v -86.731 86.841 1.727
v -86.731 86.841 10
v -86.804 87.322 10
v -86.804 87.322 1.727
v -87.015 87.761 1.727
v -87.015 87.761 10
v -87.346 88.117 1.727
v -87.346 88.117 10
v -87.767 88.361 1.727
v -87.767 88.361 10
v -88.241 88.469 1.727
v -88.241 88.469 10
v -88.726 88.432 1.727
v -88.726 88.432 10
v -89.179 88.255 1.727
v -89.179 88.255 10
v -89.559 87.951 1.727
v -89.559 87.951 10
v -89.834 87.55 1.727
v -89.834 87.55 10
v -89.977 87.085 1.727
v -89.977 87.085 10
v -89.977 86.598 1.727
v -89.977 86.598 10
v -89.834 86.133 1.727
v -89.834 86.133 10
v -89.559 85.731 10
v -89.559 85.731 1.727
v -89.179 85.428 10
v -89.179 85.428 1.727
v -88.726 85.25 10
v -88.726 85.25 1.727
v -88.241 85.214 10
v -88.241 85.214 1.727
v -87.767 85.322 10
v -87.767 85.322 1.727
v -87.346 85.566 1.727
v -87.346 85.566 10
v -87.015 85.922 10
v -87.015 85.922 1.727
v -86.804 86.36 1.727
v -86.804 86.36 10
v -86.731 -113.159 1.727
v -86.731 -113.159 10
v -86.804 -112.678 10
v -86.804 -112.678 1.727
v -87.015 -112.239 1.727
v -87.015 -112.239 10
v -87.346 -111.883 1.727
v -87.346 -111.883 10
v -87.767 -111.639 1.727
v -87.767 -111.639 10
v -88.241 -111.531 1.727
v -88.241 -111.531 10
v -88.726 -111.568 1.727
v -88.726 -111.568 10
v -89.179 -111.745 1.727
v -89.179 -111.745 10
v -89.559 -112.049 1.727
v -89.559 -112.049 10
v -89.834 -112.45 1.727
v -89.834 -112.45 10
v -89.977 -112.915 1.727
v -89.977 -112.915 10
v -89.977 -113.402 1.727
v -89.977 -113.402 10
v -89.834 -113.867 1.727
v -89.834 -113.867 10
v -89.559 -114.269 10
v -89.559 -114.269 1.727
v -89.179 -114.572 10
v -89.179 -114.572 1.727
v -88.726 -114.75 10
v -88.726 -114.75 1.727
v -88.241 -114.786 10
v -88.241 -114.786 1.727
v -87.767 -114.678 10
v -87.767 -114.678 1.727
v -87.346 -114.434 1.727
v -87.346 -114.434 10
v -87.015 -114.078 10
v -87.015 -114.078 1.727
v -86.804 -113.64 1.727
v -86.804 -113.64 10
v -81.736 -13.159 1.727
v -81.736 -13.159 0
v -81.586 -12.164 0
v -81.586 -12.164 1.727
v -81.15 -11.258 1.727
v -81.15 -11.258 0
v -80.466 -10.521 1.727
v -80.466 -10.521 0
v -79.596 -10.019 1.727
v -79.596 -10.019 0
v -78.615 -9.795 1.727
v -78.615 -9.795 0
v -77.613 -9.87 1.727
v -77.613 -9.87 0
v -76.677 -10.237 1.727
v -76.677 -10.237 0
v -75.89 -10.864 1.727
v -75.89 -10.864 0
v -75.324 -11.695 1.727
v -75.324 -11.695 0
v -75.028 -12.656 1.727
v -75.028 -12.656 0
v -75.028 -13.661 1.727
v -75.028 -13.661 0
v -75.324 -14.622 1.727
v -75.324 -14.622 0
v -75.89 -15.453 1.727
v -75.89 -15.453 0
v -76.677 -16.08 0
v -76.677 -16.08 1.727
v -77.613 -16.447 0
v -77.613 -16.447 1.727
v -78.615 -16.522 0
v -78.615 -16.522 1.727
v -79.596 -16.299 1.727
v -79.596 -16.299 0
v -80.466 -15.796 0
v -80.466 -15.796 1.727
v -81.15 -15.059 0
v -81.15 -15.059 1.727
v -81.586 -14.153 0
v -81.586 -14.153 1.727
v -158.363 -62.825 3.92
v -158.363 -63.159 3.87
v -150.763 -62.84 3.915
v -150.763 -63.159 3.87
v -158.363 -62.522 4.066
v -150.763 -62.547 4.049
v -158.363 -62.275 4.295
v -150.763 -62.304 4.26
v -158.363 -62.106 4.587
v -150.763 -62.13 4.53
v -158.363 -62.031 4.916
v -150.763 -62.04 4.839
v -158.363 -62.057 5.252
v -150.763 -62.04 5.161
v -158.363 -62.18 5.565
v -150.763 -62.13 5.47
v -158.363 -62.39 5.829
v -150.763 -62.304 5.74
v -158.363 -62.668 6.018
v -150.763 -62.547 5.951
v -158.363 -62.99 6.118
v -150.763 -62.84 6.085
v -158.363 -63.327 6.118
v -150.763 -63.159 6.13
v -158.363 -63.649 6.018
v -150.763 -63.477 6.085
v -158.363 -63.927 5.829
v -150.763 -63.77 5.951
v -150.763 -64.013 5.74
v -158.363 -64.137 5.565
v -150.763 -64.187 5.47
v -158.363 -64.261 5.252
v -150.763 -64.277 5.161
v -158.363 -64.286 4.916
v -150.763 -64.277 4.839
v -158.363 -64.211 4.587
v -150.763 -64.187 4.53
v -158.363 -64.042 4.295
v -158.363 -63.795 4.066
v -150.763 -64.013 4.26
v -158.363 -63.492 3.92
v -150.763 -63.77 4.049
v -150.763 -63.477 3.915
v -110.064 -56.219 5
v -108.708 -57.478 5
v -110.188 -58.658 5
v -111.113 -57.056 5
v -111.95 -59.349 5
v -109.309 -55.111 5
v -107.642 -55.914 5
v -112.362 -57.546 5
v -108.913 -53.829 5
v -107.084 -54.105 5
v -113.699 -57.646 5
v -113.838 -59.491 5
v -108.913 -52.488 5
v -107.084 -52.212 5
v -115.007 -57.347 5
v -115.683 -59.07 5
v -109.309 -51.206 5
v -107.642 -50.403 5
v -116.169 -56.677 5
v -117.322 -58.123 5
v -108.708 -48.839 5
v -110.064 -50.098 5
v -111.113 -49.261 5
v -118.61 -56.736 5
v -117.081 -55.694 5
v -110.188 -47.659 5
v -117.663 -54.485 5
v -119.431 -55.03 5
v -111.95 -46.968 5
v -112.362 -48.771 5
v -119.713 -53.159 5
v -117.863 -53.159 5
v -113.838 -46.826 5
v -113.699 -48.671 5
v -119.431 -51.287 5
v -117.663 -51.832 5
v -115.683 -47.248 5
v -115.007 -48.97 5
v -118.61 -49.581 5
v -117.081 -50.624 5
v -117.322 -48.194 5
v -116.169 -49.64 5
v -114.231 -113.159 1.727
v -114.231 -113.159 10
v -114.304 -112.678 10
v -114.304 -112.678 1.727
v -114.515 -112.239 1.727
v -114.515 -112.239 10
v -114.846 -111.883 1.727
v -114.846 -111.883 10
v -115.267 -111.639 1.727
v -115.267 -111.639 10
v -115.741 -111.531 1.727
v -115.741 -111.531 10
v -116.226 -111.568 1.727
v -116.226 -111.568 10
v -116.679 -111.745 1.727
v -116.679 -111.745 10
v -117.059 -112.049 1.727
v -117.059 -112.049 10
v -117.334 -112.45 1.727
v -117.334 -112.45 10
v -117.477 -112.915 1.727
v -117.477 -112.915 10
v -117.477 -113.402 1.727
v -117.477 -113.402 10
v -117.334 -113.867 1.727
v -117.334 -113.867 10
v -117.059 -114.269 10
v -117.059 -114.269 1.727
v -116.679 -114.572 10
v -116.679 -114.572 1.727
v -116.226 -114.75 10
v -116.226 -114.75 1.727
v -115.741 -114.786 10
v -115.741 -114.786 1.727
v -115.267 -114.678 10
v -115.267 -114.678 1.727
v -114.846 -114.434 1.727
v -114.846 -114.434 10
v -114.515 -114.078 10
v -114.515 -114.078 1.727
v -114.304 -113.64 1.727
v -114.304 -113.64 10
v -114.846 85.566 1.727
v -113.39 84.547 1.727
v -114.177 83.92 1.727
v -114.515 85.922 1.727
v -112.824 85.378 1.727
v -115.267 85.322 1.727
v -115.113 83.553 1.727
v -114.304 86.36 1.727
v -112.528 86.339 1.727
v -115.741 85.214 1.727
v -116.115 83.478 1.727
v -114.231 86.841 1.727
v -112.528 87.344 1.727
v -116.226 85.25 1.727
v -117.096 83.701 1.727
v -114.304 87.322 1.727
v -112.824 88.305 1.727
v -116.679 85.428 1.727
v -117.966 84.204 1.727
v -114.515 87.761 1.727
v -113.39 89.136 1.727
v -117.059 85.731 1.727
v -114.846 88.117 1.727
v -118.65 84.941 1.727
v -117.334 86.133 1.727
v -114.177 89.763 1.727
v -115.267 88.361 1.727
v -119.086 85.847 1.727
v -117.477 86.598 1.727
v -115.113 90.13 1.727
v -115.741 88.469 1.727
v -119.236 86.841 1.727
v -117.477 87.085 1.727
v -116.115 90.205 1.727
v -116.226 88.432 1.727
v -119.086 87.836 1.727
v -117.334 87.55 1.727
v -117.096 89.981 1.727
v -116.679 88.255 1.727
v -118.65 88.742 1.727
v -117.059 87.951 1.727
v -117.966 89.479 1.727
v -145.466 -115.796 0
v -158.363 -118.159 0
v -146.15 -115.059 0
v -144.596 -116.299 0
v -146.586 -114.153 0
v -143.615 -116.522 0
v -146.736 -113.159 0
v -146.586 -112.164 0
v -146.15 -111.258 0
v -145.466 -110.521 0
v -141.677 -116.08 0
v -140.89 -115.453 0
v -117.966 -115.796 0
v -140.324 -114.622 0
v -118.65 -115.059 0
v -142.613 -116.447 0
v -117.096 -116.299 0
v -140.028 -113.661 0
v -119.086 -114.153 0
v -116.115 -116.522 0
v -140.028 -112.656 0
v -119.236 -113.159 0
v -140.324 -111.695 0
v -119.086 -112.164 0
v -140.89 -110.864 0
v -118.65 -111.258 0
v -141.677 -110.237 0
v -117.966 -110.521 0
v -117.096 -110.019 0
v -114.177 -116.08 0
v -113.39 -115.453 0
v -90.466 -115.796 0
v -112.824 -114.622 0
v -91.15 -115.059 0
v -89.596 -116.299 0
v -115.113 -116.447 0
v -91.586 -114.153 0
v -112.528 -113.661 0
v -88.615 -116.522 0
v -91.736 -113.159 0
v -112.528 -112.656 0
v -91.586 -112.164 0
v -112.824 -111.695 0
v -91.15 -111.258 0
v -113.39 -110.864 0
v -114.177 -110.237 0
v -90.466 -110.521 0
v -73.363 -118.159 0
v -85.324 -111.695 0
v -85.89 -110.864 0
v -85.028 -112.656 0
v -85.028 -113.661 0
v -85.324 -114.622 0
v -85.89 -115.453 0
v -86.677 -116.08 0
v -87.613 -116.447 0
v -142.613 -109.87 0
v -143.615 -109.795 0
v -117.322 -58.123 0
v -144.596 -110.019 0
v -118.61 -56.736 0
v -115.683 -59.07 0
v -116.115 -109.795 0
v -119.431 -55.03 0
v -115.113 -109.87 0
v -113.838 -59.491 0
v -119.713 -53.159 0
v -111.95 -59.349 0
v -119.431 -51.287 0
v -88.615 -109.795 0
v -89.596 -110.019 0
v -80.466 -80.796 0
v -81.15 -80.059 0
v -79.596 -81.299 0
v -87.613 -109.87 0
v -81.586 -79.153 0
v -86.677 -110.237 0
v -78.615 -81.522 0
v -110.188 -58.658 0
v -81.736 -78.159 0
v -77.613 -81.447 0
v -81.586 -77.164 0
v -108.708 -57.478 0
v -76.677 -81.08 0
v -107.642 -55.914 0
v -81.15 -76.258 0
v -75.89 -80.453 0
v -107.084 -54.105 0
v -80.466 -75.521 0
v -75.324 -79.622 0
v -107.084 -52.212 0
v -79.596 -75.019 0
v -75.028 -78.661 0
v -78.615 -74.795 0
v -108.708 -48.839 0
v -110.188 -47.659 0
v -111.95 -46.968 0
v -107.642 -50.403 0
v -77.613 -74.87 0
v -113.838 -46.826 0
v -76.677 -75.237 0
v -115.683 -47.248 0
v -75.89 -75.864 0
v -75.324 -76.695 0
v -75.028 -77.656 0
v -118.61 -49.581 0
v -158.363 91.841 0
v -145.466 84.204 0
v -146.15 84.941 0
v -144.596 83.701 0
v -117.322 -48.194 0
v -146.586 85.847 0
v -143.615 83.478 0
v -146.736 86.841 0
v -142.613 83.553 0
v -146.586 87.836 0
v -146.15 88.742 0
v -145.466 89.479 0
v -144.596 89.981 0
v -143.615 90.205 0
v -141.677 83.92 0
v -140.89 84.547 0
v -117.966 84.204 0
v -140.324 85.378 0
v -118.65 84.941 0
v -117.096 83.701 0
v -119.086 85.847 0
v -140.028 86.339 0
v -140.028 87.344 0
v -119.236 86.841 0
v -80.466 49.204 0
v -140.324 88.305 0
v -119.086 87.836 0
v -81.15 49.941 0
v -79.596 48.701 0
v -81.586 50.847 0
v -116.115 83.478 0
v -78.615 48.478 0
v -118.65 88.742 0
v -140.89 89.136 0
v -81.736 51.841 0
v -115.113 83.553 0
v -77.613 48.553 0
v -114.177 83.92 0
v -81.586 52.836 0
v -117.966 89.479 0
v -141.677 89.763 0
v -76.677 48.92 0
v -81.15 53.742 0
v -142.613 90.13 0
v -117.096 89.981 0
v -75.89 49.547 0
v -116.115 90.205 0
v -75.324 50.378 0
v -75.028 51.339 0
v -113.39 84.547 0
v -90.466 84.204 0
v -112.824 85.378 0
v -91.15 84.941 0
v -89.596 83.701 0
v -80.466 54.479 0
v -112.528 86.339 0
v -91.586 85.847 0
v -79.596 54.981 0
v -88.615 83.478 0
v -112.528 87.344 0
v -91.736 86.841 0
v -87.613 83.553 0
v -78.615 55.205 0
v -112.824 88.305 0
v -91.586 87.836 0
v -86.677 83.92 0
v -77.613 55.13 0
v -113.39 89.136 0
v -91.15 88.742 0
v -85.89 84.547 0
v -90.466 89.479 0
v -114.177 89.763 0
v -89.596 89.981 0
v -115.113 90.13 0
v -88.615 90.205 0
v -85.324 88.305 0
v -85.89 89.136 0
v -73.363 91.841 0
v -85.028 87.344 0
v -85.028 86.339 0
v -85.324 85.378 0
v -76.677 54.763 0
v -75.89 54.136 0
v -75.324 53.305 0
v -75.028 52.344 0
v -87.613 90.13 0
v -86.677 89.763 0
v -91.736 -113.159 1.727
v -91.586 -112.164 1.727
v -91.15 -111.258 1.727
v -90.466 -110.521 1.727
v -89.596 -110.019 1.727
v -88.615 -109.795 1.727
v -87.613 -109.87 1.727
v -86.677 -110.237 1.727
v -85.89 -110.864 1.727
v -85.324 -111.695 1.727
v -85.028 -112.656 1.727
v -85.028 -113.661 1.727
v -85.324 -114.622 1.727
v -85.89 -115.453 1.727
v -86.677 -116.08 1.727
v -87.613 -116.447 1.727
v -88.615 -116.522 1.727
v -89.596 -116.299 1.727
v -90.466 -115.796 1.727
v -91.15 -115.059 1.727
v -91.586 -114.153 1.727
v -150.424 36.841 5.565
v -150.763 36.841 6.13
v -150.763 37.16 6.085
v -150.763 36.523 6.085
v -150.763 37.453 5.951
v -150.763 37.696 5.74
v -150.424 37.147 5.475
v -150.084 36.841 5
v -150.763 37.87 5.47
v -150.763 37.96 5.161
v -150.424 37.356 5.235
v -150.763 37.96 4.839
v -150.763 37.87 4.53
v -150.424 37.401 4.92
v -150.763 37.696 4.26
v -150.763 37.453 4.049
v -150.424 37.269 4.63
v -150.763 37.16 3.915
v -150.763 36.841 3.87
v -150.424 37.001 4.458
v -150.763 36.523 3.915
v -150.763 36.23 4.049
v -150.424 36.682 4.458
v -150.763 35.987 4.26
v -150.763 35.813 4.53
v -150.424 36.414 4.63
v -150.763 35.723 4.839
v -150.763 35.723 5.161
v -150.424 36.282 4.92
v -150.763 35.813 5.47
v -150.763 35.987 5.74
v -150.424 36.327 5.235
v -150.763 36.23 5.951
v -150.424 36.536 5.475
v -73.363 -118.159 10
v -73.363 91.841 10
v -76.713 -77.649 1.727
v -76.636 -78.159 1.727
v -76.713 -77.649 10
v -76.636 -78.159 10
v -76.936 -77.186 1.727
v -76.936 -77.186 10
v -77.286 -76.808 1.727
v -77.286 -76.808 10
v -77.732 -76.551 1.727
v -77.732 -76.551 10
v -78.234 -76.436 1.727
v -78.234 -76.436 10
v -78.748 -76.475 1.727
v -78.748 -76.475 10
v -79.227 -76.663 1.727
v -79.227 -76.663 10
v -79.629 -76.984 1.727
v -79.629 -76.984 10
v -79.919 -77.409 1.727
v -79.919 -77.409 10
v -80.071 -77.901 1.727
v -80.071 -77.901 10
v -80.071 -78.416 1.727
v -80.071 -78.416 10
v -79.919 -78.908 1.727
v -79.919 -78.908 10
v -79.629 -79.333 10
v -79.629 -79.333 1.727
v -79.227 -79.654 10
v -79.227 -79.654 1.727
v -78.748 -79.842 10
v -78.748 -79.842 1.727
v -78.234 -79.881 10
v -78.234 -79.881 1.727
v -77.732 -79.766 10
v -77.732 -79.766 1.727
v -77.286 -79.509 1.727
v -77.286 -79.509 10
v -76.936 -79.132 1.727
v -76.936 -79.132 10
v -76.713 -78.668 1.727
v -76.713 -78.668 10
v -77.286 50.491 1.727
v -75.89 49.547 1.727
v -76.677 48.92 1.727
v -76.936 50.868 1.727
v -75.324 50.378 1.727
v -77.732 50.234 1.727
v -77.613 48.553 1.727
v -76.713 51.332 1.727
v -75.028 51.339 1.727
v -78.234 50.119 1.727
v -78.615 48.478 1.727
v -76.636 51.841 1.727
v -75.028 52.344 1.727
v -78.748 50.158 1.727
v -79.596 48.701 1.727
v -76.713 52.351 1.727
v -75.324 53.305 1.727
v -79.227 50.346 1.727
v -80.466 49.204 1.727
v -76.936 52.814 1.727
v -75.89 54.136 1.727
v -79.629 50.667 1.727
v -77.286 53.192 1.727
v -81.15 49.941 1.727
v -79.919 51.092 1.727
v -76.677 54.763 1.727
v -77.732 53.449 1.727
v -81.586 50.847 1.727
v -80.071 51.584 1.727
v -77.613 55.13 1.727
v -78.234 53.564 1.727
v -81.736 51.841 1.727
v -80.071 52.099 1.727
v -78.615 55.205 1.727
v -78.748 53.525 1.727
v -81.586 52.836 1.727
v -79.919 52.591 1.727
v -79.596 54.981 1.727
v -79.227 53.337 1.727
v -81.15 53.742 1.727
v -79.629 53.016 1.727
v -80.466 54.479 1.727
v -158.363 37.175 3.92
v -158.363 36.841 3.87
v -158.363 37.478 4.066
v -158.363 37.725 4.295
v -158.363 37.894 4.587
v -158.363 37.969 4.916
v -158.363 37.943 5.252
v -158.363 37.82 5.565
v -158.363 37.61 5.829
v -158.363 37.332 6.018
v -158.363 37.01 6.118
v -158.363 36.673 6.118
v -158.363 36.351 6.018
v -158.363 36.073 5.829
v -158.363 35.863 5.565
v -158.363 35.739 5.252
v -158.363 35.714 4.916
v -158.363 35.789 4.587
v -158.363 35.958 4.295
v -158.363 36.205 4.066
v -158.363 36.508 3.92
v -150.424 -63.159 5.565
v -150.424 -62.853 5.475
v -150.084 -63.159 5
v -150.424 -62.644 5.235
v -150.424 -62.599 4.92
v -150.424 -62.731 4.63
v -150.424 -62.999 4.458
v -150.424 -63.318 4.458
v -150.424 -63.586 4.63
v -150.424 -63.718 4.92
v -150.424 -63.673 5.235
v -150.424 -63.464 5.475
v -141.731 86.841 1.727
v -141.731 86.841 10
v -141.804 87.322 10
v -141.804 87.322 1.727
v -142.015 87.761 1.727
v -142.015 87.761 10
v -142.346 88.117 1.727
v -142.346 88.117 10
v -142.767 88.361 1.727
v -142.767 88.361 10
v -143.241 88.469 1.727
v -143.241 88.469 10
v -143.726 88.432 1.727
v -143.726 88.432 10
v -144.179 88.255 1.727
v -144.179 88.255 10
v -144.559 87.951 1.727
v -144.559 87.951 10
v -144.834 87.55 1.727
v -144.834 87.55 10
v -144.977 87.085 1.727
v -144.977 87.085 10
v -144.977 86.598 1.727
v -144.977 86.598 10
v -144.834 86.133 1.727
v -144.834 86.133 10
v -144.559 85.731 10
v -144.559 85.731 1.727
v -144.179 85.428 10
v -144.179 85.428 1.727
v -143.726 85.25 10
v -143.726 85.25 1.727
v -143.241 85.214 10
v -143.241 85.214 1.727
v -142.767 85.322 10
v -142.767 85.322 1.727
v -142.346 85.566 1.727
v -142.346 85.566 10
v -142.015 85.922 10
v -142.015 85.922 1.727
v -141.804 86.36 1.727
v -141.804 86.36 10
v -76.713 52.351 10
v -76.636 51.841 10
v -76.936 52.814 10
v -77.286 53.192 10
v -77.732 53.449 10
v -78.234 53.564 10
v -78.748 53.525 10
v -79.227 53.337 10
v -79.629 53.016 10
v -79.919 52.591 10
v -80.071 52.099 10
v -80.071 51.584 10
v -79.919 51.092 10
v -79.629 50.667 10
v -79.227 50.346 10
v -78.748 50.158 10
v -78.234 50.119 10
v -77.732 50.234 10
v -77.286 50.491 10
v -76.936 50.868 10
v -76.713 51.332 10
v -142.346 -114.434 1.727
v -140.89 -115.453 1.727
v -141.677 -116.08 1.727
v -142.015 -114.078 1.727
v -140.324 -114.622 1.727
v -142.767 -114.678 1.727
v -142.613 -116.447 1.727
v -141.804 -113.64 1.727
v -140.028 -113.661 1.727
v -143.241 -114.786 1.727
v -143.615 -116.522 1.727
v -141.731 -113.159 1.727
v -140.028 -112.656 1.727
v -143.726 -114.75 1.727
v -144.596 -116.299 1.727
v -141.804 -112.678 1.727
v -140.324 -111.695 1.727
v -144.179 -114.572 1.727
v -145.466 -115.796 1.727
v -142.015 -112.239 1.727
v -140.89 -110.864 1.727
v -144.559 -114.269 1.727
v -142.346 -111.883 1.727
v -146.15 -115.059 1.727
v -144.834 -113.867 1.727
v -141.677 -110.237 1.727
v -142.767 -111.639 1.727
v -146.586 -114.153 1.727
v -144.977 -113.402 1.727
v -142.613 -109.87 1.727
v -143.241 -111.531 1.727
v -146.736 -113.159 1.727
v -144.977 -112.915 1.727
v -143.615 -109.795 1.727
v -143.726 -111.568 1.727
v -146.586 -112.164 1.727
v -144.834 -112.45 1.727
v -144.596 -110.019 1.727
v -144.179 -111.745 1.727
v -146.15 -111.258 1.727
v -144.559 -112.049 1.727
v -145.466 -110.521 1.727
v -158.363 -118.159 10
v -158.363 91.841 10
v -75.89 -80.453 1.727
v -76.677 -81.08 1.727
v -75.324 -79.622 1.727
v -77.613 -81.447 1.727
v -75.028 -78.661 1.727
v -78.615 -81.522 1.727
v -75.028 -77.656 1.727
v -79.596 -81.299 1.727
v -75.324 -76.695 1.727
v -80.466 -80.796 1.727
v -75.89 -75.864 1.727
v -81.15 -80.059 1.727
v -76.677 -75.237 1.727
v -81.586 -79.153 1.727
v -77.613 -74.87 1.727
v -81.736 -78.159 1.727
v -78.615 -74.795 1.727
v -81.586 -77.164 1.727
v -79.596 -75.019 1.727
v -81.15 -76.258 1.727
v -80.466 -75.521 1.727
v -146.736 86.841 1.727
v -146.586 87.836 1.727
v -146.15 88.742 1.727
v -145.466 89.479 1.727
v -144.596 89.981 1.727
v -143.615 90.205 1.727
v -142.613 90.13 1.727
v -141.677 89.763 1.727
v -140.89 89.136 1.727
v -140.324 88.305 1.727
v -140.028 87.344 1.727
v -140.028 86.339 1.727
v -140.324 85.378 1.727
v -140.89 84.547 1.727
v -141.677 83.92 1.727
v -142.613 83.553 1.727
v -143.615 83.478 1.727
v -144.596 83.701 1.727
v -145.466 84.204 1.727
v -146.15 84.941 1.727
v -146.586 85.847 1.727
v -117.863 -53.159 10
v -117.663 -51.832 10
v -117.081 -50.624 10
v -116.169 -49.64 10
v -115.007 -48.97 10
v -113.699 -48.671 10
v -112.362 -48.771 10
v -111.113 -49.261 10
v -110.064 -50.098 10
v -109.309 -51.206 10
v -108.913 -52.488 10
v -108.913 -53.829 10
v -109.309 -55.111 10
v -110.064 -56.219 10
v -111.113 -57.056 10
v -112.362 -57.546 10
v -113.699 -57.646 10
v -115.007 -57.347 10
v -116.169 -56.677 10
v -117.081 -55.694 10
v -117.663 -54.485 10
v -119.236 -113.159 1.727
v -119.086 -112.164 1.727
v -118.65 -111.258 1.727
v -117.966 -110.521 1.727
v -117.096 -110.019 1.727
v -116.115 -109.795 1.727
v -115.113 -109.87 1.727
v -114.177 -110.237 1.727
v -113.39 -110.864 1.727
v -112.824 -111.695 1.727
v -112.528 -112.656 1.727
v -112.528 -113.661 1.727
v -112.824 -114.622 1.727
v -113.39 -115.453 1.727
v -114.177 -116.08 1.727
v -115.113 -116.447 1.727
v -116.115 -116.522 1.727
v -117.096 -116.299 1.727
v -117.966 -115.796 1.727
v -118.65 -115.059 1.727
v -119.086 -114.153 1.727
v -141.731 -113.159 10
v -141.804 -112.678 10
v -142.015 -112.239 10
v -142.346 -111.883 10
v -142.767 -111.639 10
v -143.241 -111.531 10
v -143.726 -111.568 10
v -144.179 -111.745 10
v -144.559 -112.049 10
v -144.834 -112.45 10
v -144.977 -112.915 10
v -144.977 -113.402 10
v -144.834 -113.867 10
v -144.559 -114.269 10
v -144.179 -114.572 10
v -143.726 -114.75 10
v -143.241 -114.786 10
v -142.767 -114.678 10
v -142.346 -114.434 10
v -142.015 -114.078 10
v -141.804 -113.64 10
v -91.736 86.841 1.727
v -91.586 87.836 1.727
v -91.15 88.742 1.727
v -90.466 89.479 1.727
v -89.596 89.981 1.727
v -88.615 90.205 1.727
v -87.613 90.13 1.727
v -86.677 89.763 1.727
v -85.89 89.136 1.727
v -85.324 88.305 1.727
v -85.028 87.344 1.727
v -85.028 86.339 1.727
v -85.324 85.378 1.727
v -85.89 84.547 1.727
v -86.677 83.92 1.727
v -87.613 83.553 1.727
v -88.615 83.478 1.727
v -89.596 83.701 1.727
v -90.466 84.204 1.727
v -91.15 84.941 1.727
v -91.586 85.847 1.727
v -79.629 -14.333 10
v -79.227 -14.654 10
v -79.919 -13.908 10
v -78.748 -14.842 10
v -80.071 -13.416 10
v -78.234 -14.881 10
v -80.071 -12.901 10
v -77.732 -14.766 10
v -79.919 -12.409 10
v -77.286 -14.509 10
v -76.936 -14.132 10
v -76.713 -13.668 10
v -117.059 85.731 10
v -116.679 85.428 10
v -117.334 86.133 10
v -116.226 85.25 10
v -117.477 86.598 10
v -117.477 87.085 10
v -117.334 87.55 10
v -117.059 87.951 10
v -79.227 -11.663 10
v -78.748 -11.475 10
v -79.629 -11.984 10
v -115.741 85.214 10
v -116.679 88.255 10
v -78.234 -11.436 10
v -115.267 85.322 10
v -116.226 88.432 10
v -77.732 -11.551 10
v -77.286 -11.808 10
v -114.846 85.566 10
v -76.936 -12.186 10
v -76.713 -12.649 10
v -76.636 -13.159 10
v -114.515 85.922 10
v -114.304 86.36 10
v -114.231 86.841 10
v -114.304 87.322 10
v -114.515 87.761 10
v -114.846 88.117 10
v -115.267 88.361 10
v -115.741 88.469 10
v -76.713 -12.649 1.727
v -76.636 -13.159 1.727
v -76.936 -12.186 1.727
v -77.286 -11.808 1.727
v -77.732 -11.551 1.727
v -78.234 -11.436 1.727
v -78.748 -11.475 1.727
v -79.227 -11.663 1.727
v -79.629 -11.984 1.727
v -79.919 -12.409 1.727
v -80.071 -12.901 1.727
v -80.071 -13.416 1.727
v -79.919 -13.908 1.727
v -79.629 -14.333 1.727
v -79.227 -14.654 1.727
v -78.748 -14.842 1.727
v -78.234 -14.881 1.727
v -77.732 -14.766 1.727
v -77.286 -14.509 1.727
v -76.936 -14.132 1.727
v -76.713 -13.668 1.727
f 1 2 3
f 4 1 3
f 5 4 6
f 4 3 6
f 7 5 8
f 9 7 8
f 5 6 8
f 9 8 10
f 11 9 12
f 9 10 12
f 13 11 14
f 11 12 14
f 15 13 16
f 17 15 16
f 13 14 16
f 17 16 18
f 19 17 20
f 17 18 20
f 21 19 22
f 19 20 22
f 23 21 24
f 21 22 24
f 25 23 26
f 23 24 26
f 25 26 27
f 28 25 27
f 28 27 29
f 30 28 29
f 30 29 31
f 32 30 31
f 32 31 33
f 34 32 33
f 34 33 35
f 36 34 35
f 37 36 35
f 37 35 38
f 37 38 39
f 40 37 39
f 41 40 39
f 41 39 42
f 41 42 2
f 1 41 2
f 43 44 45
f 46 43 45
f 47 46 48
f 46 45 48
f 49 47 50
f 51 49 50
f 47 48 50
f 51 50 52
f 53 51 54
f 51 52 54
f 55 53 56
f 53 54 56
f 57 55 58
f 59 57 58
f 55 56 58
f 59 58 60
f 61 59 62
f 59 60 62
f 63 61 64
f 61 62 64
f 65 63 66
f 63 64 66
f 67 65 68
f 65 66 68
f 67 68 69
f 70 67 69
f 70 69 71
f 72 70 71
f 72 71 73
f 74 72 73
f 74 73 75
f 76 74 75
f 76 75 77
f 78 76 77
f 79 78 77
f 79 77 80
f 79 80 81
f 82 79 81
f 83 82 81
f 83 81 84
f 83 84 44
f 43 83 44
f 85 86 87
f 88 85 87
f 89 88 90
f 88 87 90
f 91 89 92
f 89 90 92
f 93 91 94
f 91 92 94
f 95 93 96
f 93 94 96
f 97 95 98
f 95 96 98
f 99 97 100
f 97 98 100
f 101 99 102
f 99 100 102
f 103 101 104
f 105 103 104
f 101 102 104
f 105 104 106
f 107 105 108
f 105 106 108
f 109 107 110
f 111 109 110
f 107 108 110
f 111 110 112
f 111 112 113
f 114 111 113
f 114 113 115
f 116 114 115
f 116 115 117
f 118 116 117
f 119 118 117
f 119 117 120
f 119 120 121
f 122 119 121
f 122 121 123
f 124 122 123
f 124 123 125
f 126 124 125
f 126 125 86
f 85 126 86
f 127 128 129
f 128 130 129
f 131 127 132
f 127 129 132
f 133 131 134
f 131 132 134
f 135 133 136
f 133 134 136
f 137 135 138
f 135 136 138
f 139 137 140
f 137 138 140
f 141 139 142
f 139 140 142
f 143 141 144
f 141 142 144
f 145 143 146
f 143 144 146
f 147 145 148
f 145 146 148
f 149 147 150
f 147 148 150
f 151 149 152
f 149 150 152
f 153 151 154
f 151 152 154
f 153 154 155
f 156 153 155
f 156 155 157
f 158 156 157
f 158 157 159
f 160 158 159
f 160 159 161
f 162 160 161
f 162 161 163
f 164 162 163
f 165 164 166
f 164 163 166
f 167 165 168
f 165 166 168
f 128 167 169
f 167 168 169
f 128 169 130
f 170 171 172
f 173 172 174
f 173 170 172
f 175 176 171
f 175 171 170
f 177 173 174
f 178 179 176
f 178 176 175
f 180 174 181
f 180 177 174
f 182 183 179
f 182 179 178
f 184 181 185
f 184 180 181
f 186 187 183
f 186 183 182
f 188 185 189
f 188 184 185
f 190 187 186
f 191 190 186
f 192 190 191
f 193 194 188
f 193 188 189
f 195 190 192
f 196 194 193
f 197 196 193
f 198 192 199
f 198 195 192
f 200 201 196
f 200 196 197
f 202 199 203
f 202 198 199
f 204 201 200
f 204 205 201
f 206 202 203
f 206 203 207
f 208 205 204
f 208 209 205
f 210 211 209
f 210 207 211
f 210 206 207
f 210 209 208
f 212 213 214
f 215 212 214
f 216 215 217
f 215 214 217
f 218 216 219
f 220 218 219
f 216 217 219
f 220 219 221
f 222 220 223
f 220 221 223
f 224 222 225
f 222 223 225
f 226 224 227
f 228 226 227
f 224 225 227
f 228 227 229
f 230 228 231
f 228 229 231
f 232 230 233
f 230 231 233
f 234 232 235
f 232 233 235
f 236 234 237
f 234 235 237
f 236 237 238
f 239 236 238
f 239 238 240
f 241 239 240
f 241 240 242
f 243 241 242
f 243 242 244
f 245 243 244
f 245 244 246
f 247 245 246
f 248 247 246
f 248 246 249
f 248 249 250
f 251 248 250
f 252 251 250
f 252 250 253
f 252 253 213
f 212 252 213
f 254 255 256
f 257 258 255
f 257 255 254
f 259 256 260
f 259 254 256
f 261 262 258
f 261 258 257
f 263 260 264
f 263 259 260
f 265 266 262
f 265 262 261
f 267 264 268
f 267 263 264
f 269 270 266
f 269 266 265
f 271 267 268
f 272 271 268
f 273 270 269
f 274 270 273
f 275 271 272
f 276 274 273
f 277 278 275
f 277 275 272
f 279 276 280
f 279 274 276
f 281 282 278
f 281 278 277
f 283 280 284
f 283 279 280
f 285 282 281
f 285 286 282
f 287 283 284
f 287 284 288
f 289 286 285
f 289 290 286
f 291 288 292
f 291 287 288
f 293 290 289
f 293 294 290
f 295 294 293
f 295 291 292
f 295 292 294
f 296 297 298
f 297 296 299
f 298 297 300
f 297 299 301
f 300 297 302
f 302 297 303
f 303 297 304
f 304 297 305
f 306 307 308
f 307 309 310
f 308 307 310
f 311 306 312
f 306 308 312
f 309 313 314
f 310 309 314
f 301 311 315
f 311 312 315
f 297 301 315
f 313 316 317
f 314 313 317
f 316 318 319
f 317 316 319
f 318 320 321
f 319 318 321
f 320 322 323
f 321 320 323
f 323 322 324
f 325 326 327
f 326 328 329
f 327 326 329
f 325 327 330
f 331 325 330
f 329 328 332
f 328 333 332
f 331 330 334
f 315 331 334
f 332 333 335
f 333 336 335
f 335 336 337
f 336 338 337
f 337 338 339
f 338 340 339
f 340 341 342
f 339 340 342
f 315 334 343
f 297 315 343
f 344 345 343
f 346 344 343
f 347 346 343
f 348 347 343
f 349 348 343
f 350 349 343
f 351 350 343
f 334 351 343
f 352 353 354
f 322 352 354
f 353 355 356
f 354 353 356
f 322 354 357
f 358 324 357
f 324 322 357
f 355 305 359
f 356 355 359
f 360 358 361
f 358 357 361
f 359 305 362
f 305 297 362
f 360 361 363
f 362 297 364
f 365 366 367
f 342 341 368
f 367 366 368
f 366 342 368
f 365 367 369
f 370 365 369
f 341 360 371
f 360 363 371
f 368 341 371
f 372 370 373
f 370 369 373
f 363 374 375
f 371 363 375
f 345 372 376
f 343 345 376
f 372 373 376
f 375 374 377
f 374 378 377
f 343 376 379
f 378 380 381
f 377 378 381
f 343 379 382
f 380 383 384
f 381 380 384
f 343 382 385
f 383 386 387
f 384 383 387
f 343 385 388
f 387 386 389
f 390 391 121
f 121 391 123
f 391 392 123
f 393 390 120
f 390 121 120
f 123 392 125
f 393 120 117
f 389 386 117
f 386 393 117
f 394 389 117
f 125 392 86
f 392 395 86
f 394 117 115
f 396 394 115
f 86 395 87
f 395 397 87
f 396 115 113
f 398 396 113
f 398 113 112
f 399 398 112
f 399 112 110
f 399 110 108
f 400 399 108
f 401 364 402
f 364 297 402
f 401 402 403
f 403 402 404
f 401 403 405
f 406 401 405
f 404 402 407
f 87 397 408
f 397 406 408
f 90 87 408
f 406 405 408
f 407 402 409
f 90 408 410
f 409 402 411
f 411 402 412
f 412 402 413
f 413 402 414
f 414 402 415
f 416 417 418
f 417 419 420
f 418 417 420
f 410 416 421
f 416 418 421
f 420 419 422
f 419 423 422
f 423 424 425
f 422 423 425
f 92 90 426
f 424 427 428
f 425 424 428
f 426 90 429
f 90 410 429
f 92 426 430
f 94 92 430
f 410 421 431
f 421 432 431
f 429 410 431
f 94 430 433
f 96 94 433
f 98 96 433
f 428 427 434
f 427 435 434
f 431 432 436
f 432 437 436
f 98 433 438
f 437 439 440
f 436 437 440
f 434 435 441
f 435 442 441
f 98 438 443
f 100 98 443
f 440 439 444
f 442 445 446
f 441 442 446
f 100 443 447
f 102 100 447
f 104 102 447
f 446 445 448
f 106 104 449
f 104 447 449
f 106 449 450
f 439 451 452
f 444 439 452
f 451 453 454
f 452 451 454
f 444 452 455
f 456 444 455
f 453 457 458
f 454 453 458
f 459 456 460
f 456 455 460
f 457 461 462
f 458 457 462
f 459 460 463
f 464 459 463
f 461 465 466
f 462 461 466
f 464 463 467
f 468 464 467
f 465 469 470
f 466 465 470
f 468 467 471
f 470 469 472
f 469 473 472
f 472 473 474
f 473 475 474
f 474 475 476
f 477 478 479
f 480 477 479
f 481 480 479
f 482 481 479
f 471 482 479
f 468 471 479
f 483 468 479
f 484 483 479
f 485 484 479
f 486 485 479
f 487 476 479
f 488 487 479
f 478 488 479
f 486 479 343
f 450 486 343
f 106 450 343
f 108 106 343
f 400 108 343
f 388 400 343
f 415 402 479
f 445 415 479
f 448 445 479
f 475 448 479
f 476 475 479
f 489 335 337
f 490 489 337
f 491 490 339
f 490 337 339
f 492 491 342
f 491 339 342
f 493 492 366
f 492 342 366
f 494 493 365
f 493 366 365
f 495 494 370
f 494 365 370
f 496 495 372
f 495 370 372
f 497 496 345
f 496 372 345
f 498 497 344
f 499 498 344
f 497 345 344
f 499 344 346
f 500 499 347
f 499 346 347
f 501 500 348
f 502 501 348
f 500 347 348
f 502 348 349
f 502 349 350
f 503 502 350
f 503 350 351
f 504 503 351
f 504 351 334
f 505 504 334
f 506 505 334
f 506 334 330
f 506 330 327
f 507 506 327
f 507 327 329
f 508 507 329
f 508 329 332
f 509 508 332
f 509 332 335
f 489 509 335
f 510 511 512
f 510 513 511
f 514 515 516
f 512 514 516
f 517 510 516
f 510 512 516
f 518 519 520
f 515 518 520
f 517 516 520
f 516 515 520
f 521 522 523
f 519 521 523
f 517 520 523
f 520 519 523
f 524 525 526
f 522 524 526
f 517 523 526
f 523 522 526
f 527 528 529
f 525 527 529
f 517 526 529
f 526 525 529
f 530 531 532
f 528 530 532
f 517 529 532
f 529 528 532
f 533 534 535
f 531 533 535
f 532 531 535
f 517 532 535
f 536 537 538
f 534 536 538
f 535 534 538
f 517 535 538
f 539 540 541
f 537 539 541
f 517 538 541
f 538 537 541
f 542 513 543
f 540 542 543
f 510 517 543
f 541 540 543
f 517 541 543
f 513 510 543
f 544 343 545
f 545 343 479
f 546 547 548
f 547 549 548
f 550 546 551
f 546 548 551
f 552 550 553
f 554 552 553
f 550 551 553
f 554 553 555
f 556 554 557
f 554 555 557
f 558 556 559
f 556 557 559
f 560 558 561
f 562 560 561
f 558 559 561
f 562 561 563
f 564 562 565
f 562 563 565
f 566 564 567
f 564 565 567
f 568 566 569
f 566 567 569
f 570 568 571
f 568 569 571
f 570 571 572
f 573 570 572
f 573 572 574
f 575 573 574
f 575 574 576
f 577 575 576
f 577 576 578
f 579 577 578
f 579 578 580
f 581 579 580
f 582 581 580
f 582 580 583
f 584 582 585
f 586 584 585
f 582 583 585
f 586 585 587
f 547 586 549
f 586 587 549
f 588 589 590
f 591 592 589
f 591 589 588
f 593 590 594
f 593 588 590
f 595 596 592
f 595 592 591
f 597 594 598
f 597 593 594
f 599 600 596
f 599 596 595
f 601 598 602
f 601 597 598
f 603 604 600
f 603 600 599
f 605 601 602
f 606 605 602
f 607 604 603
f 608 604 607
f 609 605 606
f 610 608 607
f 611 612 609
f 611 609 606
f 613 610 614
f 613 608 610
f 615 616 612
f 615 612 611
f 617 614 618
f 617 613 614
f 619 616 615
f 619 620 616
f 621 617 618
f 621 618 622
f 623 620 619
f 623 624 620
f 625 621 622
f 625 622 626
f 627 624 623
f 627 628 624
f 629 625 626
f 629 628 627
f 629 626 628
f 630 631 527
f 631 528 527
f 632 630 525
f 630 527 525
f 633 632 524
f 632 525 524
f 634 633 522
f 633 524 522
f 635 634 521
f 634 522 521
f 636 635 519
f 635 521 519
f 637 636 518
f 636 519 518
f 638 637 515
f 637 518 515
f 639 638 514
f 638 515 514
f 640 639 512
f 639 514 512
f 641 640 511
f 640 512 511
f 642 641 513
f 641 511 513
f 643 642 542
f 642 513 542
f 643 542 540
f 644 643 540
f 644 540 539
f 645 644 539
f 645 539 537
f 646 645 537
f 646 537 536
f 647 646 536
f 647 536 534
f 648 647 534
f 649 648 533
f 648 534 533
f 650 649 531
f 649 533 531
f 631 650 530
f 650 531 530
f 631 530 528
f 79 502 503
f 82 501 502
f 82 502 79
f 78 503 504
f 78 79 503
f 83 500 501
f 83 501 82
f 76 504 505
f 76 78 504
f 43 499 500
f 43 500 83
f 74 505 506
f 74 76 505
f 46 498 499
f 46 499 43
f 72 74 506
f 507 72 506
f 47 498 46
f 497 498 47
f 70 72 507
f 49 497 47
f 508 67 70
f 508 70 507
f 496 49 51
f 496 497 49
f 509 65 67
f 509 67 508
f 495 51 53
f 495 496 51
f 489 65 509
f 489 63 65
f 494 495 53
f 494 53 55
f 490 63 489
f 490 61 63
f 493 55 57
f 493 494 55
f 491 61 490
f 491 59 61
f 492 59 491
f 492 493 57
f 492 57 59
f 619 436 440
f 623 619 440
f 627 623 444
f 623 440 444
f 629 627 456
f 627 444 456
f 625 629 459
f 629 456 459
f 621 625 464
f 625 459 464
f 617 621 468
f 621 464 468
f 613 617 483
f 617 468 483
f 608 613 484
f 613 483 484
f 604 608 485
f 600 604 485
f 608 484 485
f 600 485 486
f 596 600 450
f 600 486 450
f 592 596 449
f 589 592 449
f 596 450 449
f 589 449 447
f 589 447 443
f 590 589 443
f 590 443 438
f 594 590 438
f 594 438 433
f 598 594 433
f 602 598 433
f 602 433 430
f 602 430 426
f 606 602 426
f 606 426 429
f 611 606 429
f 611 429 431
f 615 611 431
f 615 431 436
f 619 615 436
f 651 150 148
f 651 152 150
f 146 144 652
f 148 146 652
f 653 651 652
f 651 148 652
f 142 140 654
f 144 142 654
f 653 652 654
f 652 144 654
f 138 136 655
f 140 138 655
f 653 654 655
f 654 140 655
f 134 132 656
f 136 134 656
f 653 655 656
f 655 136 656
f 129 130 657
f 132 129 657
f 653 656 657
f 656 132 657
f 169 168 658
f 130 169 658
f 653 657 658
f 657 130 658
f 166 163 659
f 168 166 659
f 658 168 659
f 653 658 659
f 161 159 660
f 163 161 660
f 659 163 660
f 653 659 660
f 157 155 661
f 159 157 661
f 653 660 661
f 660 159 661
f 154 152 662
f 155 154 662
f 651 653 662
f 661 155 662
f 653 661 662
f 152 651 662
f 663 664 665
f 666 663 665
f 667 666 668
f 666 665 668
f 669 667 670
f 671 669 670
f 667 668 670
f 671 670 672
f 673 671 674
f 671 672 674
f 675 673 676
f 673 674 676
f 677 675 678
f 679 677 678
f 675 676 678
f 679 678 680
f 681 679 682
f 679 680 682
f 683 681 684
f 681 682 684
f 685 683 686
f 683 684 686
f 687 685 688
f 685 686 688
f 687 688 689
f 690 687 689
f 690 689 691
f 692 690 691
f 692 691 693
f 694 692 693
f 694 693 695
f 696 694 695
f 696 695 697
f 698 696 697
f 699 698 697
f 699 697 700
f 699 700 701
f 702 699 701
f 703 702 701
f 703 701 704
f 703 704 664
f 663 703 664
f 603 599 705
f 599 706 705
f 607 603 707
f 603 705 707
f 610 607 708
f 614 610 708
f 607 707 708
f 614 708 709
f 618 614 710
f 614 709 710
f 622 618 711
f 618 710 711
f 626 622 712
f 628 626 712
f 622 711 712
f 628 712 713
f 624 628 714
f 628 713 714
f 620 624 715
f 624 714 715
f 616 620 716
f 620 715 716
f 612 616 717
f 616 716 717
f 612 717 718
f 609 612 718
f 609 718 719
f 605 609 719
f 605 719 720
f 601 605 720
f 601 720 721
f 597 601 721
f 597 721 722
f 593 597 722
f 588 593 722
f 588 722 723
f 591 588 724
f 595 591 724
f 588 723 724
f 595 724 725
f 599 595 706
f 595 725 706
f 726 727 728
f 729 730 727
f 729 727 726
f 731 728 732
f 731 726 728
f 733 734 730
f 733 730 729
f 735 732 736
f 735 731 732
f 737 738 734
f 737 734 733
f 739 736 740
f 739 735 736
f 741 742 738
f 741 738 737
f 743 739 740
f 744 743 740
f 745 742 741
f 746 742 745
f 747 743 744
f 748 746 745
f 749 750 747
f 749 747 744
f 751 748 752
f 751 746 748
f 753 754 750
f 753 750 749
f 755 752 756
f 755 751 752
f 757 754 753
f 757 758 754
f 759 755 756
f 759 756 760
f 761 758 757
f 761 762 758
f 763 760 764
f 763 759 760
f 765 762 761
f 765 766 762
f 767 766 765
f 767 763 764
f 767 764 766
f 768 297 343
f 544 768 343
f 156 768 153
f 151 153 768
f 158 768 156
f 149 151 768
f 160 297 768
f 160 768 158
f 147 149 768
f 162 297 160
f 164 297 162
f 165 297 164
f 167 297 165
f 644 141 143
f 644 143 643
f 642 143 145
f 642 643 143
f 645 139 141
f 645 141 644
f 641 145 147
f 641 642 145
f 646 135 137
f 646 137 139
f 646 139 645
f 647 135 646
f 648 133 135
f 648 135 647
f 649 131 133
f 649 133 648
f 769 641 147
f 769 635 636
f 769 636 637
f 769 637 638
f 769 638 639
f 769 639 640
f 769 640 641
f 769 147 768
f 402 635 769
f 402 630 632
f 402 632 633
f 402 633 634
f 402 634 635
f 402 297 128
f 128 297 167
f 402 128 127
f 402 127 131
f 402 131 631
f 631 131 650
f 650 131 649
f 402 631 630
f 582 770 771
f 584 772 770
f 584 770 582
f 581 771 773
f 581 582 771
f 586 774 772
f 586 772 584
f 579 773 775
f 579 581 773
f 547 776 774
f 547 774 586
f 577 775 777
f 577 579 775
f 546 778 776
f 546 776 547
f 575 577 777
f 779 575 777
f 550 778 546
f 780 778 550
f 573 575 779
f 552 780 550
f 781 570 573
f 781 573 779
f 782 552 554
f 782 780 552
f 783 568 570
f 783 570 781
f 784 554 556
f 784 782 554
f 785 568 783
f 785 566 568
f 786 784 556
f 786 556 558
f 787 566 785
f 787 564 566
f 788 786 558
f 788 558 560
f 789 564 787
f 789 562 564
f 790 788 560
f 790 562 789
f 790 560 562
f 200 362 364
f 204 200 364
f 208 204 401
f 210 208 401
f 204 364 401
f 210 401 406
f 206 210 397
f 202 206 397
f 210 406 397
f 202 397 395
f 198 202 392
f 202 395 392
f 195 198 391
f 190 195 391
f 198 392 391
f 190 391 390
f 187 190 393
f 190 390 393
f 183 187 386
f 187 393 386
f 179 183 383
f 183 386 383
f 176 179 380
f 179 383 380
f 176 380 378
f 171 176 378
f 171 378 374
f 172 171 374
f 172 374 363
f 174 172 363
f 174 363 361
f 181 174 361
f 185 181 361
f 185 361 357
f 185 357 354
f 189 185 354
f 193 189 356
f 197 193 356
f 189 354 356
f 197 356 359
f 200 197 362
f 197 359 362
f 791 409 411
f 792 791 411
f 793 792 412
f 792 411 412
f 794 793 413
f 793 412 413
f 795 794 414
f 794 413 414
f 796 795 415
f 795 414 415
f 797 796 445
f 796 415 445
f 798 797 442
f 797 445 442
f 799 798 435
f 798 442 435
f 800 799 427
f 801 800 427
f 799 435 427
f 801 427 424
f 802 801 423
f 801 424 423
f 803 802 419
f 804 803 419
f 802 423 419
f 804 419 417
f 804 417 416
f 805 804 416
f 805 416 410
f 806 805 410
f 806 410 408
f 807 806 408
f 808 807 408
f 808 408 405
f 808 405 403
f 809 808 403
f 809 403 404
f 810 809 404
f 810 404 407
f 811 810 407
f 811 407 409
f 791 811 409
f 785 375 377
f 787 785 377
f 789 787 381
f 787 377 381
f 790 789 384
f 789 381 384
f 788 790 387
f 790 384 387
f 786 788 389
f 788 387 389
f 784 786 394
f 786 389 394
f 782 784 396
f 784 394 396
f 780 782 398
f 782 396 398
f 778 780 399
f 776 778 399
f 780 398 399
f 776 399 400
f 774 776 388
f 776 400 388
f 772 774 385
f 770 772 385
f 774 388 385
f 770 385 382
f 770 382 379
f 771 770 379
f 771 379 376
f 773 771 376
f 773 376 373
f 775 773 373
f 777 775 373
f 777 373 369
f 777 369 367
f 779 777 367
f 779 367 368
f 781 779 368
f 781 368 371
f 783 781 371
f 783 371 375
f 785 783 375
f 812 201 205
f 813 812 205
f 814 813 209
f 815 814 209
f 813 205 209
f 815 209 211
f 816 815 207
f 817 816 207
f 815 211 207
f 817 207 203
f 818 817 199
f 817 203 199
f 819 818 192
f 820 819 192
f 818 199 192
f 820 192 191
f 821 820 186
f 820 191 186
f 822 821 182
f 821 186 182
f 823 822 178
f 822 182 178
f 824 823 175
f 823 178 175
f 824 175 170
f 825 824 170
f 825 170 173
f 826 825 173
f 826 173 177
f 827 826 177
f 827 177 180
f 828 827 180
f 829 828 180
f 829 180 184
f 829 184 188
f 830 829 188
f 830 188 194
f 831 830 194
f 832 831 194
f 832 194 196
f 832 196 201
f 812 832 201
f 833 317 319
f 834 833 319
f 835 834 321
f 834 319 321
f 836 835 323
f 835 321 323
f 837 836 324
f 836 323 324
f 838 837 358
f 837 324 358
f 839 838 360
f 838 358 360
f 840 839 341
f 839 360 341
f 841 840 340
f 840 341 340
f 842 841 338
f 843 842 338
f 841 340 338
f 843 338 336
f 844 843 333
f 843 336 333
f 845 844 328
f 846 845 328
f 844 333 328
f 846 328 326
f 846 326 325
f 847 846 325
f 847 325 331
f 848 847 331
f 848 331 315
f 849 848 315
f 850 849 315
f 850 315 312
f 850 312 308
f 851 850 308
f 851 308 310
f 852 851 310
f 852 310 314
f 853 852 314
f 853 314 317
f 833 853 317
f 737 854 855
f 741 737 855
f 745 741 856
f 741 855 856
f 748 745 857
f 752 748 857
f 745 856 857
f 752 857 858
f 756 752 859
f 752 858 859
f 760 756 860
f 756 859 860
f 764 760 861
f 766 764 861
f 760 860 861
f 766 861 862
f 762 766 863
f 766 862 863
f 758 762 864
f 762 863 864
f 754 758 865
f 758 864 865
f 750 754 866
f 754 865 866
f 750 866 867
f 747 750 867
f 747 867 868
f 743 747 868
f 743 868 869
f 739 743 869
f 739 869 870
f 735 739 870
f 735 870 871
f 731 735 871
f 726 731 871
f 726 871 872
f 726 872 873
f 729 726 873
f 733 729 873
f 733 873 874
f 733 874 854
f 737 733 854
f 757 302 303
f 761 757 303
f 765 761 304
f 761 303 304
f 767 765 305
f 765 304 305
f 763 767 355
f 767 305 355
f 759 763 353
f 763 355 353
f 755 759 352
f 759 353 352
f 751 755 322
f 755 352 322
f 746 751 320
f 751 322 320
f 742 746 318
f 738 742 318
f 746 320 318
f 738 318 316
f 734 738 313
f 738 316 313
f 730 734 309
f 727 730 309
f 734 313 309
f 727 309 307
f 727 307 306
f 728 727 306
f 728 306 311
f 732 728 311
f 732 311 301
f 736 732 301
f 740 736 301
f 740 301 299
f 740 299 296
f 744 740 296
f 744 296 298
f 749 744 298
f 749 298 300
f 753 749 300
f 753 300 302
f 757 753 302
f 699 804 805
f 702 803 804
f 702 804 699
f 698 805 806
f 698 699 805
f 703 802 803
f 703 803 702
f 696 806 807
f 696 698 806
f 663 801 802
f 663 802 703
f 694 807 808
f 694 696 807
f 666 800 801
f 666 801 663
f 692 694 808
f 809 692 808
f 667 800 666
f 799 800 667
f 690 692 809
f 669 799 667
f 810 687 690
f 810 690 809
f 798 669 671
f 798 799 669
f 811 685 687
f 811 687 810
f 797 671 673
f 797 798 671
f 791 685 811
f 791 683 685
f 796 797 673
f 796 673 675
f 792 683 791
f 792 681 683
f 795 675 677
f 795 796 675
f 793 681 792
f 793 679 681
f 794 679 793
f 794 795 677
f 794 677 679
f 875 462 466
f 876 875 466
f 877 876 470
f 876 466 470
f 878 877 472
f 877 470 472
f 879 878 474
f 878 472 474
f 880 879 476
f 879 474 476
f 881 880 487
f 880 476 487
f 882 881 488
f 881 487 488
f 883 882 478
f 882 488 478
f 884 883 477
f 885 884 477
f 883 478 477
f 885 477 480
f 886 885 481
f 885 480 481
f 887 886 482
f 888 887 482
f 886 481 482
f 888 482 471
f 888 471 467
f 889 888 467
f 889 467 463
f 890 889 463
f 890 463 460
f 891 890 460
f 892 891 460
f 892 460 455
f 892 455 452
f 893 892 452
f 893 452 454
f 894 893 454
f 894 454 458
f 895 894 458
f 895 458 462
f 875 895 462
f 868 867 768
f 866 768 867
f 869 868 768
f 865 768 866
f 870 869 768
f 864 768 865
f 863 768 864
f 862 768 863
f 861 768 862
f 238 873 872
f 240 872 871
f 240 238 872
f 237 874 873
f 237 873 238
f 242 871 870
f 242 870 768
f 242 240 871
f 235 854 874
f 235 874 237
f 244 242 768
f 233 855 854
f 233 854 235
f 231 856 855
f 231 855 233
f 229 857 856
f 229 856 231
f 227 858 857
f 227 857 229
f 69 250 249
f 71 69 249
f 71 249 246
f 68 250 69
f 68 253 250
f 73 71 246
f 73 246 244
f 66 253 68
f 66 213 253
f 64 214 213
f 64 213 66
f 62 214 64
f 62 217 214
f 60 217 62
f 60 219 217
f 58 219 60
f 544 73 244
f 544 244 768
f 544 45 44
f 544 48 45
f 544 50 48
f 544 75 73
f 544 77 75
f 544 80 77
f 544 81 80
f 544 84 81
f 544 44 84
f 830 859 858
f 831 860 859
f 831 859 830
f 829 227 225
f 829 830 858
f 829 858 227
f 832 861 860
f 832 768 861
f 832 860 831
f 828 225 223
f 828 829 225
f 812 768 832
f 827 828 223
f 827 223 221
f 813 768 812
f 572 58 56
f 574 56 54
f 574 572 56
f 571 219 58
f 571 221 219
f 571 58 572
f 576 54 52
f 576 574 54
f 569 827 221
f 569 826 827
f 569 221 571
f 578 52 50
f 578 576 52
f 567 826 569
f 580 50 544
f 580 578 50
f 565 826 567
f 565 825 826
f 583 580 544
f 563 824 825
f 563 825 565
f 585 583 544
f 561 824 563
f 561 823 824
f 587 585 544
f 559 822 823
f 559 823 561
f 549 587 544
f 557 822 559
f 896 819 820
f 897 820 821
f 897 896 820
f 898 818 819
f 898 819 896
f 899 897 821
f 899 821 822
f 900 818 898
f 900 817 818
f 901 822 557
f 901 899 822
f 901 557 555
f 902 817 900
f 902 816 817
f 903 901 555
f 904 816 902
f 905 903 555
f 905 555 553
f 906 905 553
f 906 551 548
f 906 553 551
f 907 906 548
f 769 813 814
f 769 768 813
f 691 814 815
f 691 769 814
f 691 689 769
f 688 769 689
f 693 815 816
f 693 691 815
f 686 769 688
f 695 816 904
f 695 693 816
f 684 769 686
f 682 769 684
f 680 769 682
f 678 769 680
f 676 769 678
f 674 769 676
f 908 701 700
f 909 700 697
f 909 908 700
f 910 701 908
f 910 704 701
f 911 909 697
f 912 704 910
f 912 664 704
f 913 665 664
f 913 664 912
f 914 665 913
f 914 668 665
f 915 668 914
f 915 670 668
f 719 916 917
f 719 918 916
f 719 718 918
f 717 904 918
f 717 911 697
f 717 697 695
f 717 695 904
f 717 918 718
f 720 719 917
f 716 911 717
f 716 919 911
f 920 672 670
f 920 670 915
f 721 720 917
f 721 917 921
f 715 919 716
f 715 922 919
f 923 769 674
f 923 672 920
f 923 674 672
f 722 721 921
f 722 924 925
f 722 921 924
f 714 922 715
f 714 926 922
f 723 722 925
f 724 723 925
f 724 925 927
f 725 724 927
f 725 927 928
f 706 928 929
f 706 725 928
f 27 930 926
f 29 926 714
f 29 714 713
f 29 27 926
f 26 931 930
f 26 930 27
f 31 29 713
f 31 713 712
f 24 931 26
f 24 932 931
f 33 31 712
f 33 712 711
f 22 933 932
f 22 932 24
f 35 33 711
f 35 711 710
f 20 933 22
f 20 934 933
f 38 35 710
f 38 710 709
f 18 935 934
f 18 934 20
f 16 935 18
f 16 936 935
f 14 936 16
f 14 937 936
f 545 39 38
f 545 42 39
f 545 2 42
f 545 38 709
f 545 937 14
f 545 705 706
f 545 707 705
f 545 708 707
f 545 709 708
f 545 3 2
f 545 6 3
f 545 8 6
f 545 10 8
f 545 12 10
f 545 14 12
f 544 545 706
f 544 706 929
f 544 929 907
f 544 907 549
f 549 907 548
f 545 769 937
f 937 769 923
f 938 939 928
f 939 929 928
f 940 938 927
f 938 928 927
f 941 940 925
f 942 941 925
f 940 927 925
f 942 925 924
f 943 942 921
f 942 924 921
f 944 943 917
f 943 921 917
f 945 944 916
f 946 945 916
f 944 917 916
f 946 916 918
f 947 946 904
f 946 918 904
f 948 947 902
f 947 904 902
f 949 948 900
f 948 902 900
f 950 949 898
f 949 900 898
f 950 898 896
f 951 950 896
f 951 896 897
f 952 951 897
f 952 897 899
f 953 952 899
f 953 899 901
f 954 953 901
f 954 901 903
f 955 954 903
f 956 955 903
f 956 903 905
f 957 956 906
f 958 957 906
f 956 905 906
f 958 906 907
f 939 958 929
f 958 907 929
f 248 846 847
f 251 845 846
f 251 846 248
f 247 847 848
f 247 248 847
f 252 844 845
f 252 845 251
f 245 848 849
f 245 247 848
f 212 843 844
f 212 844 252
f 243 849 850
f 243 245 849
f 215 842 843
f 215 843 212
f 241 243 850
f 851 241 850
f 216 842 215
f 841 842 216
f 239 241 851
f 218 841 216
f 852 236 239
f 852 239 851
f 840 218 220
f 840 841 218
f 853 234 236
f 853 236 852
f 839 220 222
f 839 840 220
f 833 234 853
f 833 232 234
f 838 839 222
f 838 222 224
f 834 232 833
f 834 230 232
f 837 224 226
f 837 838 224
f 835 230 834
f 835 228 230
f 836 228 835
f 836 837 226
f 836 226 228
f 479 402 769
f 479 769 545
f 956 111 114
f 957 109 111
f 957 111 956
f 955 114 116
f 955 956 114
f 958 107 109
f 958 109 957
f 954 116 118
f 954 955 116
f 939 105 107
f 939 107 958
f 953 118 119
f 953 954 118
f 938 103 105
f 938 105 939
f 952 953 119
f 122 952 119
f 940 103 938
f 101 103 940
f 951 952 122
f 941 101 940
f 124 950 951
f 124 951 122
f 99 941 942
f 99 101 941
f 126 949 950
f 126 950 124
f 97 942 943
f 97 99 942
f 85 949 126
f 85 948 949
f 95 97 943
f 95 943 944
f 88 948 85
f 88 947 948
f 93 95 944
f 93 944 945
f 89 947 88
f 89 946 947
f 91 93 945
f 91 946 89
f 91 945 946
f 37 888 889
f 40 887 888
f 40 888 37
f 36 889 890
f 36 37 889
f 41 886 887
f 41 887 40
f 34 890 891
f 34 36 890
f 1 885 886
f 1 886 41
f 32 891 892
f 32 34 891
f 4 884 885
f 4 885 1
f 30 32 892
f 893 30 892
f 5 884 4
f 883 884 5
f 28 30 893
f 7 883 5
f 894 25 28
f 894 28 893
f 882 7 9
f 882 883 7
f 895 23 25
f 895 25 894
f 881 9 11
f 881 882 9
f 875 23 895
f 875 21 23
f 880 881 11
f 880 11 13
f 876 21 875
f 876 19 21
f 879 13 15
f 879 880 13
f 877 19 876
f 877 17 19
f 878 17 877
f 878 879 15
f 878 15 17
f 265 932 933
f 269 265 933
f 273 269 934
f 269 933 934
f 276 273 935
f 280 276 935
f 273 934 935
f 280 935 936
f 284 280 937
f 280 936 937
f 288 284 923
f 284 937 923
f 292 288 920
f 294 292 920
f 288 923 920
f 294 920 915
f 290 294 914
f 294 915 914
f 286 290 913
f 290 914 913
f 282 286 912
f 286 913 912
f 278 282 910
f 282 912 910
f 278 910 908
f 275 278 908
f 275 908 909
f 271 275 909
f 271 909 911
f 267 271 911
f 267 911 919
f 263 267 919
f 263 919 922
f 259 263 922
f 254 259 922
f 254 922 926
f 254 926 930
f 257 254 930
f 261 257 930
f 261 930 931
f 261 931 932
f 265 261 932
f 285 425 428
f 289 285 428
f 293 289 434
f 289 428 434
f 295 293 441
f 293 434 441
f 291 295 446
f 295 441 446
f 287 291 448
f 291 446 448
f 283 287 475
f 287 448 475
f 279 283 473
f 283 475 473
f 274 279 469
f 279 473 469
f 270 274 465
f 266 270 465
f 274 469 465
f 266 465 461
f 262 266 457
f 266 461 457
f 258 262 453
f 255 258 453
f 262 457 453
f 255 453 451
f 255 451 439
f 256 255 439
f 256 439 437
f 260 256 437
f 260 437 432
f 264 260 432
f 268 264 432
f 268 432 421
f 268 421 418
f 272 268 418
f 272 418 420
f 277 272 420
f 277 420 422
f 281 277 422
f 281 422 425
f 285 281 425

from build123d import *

# Parameters (mm, degrees)
SKETCH1_W                                           = 85
SKETCH1_H                                           = 210
BOSS_EXTRUDE1_DEPTH                                 = 10
CBORE_FOR_4_BINDING_HEAD_MACHINE_SCREW1_D           = 3.4544
CBORE_FOR_4_BINDING_HEAD_MACHINE_SCREW1_CBORE_D     = 6.74624
CBORE_FOR_4_BINDING_HEAD_MACHINE_SCREW1_CBORE_DEPTH = 1.7272
CBORE_FOR_4_BINDING_HEAD_MACHINE_SCREW2_D           = 3.2639
CBORE_FOR_4_BINDING_HEAD_MACHINE_SCREW2_DEPTH       = 10
CBORE_FOR_4_BINDING_HEAD_MACHINE_SCREW2_CBORE_D     = 6.74624
CBORE_FOR_4_BINDING_HEAD_MACHINE_SCREW2_CBORE_DEPTH = 1.7272
SKETCH10_R                                          = 6.35
SKETCH10_R_2                                        = 4.5
CUT_EXTRUDE1_DEPTH                                  = 5
CUT_EXTRUDE3_REACH                                  = 12
SKETCH10_3_R                                        = 4.5
F_4_40_TAPPED_HOLE2_D                               = 2.2606
F_4_40_TAPPED_HOLE2_DEPTH                           = 7.6
F_4_40_TAPPED_HOLE2_TIP                             = 0.679152758


with BuildPart() as part:
    # Sketch1 → Boss-Extrude1 (new body)
    with BuildSketch(Plane.XY):
        with Locations((-115.863171355, -13.158567775)):
            Rectangle(SKETCH1_W, SKETCH1_H)
    extrude(amount=BOSS_EXTRUDE1_DEPTH)

    # CBORE for #4 Binding Head Machine Screw1 (through all)
    with Locations(Plane(origin=(0, 0, 0), x_dir=(-1, 0, 0), z_dir=(0, 0, -1))):
        with Locations((78.363171355, 51.841432225), (78.363171355, -13.158567775), (78.363171355, -78.158567775)):
            CounterBoreHole(CBORE_FOR_4_BINDING_HEAD_MACHINE_SCREW1_D / 2, CBORE_FOR_4_BINDING_HEAD_MACHINE_SCREW1_CBORE_D / 2, CBORE_FOR_4_BINDING_HEAD_MACHINE_SCREW1_CBORE_DEPTH)

    # CBORE for #4 Binding Head Machine Screw2
    with Locations(Plane(origin=(0, 0, 0), x_dir=(-1, 0, 0), z_dir=(0, 0, -1))):
        with Locations((88.363171355, 86.841432225), (115.863171355, 86.841432225), (143.363171355, 86.841432225), (143.363171355, -113.158567775), (115.863171355, -113.158567775), (88.363171355, -113.158567775)):
            CounterBoreHole(CBORE_FOR_4_BINDING_HEAD_MACHINE_SCREW2_D / 2, CBORE_FOR_4_BINDING_HEAD_MACHINE_SCREW2_CBORE_D / 2, CBORE_FOR_4_BINDING_HEAD_MACHINE_SCREW2_CBORE_DEPTH, depth=CBORE_FOR_4_BINDING_HEAD_MACHINE_SCREW2_DEPTH)

    # Sketch10 → Cut-Extrude1 (cut)
    with BuildSketch(Plane(origin=(0, 0, 0), x_dir=(-1, 0, 0), z_dir=(0, 0, -1))):
        with Locations((113.363171355, -53.158567775)):
            Circle(SKETCH10_R)
        with Locations((113.363171355, -53.158567775)):
            Circle(SKETCH10_R_2, mode=Mode.SUBTRACT)
    extrude(amount=-CUT_EXTRUDE1_DEPTH, mode=Mode.SUBTRACT)

    # Sketch10<3> → Cut-Extrude3 (cut, up to next)
    with BuildSketch(Plane(origin=(0, 0, 0), x_dir=(-1, 0, 0), z_dir=(0, 0, -1)), mode=Mode.PRIVATE) as cut_extrude3_sk1:
        with Locations((113.363171355, -53.158567775)):
            Circle(SKETCH10_3_R)
    cut_extrude3_tool1 = extrude(cut_extrude3_sk1.sketch, amount=-CUT_EXTRUDE3_REACH, mode=Mode.PRIVATE) & part.part
    add(cut_extrude3_tool1.solids().sort_by_distance((-113.363171, -53.158568, 0))[0], mode=Mode.SUBTRACT)

    # #4-40 Tapped Hole2
    with Locations(Plane.ZY.offset(158.363171355)):
        with Locations((5, -63.158567775), (5, 36.841432225)):
            Hole(F_4_40_TAPPED_HOLE2_D / 2, depth=F_4_40_TAPPED_HOLE2_DEPTH)
            with Locations((0, 0, -(F_4_40_TAPPED_HOLE2_DEPTH + F_4_40_TAPPED_HOLE2_TIP / 2))):  # 118° drill point
                Cone(0, F_4_40_TAPPED_HOLE2_D / 2, F_4_40_TAPPED_HOLE2_TIP, mode=Mode.SUBTRACT)


solid = part.part
